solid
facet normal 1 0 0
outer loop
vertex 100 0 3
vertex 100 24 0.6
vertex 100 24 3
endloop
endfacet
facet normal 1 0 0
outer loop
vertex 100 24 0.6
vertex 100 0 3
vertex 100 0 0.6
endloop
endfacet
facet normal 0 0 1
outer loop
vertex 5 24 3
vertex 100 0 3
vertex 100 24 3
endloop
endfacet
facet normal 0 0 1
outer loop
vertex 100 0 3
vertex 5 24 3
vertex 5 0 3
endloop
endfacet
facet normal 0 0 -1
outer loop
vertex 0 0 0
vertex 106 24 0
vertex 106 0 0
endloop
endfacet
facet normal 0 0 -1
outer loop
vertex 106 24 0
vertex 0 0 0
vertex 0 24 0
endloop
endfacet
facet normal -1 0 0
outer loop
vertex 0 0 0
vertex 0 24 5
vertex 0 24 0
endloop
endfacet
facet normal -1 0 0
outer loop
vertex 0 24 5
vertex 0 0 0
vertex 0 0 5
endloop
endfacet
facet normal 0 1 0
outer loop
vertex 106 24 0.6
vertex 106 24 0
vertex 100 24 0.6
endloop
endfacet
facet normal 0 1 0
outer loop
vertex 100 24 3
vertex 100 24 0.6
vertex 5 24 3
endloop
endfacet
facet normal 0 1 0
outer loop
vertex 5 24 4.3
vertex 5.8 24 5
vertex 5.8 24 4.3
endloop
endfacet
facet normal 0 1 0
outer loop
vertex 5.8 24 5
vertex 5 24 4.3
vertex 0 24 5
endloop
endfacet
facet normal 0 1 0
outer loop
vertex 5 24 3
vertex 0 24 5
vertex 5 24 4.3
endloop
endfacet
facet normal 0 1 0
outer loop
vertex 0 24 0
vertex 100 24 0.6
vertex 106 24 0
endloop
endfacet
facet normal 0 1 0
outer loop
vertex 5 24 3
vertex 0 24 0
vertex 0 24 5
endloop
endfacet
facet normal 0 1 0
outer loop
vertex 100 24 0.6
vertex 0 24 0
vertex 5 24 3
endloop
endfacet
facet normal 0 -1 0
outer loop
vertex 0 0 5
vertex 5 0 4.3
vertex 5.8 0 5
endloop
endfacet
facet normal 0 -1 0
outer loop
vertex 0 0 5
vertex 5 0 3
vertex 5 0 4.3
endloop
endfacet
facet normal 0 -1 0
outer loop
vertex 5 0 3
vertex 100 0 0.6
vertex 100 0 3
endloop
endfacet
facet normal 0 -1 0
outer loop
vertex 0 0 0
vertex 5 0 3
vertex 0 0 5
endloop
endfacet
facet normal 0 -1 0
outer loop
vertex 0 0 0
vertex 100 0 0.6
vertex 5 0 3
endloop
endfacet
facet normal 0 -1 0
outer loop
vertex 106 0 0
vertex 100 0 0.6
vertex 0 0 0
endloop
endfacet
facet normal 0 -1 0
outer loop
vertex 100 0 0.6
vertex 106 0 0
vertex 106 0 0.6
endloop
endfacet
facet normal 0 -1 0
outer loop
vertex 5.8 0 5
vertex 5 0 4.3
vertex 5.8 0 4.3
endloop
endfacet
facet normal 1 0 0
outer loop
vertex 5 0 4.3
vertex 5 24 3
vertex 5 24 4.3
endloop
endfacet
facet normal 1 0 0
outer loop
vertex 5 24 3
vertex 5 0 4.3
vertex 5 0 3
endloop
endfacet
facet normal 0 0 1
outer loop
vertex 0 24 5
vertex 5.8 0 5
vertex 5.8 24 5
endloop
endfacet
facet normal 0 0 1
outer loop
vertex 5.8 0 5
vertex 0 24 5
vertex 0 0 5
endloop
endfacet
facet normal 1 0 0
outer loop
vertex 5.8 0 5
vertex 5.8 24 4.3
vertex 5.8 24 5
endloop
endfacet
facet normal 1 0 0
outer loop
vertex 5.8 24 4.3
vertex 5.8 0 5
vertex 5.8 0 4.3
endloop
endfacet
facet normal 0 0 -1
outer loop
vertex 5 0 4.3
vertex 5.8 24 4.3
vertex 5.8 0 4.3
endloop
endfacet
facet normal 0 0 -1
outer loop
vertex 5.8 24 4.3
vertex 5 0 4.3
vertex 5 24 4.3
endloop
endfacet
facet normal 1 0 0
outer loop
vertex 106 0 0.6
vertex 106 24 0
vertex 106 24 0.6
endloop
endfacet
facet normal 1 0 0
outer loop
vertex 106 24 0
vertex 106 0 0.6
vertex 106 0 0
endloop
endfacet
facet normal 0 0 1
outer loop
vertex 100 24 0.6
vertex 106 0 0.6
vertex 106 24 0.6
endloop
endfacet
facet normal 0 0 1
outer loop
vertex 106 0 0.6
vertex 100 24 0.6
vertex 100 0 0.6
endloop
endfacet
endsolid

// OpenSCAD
/* Bag clip with living hinge - PETG, 0.4mm nozzle, no supports
   Printed open flat (single print, fuses into one piece), folds shut on 2mm folded bag.
   Two verification parts (lower + upper) that fuse at hinge when printed together.
   Assembly shows closed on bag, motion "closing" folds upper onto lower/bag.
*/
/* [Print] */
part = "lower"; // [lower, upper, assembly]

cadverify_only = "";
module instance(name, part, unit = 1) {
    echo(cadverify_instance = [name, part, unit]);
    if (cadverify_only == "" || cadverify_only == name) children();
}

// ---- parameters (mm) ----
arm_len = 100;
arm_w = 24;
arm_t = 3;
hinge_len = 6;
hinge_t = 0.6;
tab_len = 12;
heel_len = 8;
catch_w = 5;
lip = 0.8;
lip_t = 0.7;
bag_t = 2;

lower_xmax = 106;      // 0..106
upper_len_print = 112; // 0..112
closed_h = 8.2;
pivot_x = 103.05;
pivot_z = 4.1;

module lower_geo() {
    // base
    cube([100, arm_w, arm_t]);
    // catch block at free end (x 0..5), overlap into base
    translate([0, 0, 2.98]) cube([5, arm_w, 2.02]);
    // catch lip protruding +x, overlap into block
    translate([4.98, 0, 4.3]) cube([0.82, arm_w, 0.7]);
    // living hinge leaf, overlap into base
    translate([99.98, 0, 0]) cube([6.02, arm_w, hinge_t]);
}

module upper_geo() {
    // base 0..100
    cube([100, arm_w, arm_t]);
    // heel at hinge end on top
    translate([0, 0, 2.98]) cube([8, arm_w, 2.02]);
    // hook leg near free end on top
    translate([92.2, 0, 2.98]) cube([2, arm_w, 1.82]);
    // hook lip protruding +x from leg side
    translate([94.18, 0, 4.1]) cube([0.82, arm_w, 0.7]);
    // thumb tab extension beyond free end
    translate([99.98, 0, 0]) cube([12.02, arm_w, arm_t]);
}

module bag_geo() {
    translate([8, 0, 3]) cube([84, arm_w, bag_t]);
}

if (part == "lower") {
    echo(cadverify_spec = [
        ["bounds", [[0, 0, 0], [106, 24, 5]]],
        ["bodies", 1],
        ["through_holes", 0],
        ["support_faces", [["bed", "-z", 500]]],
        ["overhangs_allowed", [["catch lip bridge", [[4.5, 0, 4.0], [6.2, 24, 5.1]]]]],
        ["copies", 1],
        ["details", [
            ["base", "material", [[10, 0, 0], [90, 24, 3]], 1],
            ["catch", "material", [[0, 0, 3], [5, 24, 5]], 1],
            ["catch_lip", "material", [[5.0, 0.1, 4.35], [5.75, 23.9, 4.95]], 0.9],
            ["hinge", "material", [[100.05, 0.1, 0.05], [105.95, 23.9, 0.55]], 0.9],
            ["hook_space", "void", [[5.8, 0, 3], [8.6, 24, 5.4]], 1],
            ["bag_space", "void", [[8, 0, 5.1], [92, 24, 7]], 1],
            ["wall", "thickness", [50, 12, 6], [0, 0, -1], 3],
            ["film", "thickness", [103, 12, 2], [0, 0, -1], 0.6],
            ["hinge_top", "view", [[99, 0, 0], [107, 24, 1]]]
        ]]
    ]);
    lower_geo();
} else if (part == "upper") {
    echo(cadverify_spec = [
        ["bounds", [[0, 0, 0], [112, 24, 5]]],
        ["bodies", 1],
        ["through_holes", 0],
        ["support_faces", [["bed", "-z", 500]]],
        ["overhangs_allowed", [["hook lip bridge", [[91.5, 0, 2.8], [96, 24, 5]]]]],
        ["copies", 1],
        ["details", [
            ["heel", "material", [[0, 0, 3], [8, 24, 5]], 1],
            ["arm", "material", [[10, 0, 0], [80, 24, 3]], 1],
            ["hook_leg", "material", [[92.3, 0.1, 3.05], [94.1, 23.9, 4.75]], 0.9],
            ["hook_lip", "material", [[94.2, 0.1, 4.15], [94.95, 23.9, 4.75]], 0.9],
            ["tab", "material", [[100, 0, 0], [112, 24, 3]], 1],
            ["catch_space", "void", [[95, 0, 3], [99.9, 24, 5]], 1],
            ["wall", "thickness", [50, 12, 6], [0, 0, -1], 3],
            ["heel_wall", "thickness", [4, 12, 7], [0, 0, -1], 5],
            ["thumb", "view", [[99, 0, 0], [113, 24, 3.5]]]
        ]]
    ]);
    upper_geo();
} else if (part == "assembly") {
    echo(cadverify_spec = [
        ["bounds", [[0, 0, 0], [218, 24, 5]]],
        ["support_faces", [["bed", "-z", 1000]]],
        ["motions", [
            ["closing", ["upper"], "rotate", [103, 12, 4.1], [0, -1, 0], [0, 180],
                ["flex", [["upper", "lower", 1, "latch snap and heel clearance"]]], ["stops", [180]], ["rests", [180]]]
        ]],
        ["assembly_order", [
            [["lower"], [0, 0, 0]],
            [["bag"], [0, 0, -1]],
            [["upper"], [0, 0, -1]]
        ]]
    ]);
    instance("lower", "lower") lower_geo();
    instance("upper", "upper") translate([106, 0, 0]) upper_geo();
    instance("bag", "external") bag_geo();
}
